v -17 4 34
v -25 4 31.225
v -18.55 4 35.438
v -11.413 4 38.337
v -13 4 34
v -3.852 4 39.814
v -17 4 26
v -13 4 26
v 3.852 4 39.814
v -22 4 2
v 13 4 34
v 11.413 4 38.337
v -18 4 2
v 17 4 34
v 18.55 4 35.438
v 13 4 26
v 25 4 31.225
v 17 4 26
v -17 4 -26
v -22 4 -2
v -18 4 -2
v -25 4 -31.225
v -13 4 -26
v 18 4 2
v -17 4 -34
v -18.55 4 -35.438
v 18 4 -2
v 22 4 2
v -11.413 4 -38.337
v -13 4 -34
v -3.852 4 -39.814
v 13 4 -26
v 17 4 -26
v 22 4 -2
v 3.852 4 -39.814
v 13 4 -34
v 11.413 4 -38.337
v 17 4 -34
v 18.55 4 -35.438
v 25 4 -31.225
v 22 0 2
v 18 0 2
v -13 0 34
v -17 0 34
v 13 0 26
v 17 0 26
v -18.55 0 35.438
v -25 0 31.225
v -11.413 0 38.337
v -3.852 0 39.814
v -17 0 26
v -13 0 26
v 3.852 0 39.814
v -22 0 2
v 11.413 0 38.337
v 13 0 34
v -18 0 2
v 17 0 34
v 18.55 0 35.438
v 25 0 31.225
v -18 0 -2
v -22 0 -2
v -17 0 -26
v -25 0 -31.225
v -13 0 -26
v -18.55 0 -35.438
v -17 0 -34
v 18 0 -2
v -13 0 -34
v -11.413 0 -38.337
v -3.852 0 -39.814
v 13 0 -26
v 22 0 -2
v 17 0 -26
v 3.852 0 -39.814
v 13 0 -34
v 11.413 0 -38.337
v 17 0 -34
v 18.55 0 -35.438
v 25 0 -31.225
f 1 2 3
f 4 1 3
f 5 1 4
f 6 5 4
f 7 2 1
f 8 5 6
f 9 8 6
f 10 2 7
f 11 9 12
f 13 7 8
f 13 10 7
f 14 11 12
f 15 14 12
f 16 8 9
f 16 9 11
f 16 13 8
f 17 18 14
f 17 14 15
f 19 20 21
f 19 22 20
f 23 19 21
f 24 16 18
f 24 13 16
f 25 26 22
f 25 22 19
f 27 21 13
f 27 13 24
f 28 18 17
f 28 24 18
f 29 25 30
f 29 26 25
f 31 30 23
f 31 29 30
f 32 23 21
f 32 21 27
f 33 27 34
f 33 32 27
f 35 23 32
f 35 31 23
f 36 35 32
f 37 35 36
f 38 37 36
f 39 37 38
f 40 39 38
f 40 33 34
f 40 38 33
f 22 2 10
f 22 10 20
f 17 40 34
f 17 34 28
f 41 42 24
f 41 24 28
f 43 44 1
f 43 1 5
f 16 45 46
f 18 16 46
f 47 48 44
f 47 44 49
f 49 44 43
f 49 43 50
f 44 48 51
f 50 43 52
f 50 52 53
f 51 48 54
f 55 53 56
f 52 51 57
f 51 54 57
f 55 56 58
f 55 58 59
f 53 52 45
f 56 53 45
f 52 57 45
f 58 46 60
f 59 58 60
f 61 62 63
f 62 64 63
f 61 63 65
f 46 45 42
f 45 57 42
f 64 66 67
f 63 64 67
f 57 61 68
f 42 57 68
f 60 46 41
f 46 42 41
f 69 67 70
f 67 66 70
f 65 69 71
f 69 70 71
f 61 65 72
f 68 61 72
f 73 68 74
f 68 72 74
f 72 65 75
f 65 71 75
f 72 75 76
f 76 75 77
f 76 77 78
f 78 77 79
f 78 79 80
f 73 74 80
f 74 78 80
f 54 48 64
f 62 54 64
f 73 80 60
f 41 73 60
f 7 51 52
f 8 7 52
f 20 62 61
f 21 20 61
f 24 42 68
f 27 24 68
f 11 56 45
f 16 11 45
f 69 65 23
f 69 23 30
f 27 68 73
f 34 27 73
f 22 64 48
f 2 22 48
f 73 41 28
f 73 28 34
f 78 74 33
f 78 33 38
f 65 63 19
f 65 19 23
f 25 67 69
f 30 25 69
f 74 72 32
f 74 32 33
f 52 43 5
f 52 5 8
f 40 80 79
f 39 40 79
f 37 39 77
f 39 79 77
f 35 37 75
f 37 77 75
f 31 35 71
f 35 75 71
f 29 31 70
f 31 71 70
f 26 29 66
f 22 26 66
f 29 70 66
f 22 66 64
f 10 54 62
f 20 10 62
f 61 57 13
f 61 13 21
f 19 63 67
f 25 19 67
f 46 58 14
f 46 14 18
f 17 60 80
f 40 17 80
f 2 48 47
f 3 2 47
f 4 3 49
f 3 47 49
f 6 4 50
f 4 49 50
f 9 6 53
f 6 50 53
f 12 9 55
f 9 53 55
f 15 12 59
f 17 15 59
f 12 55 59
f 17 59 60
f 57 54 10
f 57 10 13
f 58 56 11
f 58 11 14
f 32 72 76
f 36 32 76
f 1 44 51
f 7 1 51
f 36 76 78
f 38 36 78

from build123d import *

# Parameters (mm, degrees)
SKETCH1_W           = 4
SKETCH1_H           = 8
SKETCH1_H_2         = 4
BOSS_EXTRUDE1_DEPTH = 4


with BuildPart() as part:
    # Sketch1 → Boss-Extrude1 (new body)
    with BuildSketch(Plane(origin=(0, 0, 0), x_dir=(1, 0, 0), z_dir=(0, 1, 0))):
        with BuildLine():
            ThreePointArc((25, 31.224989992), (0, 40), (-25, 31.224989992))
            Line((-25, 31.224989992), (-25, -31.224989992))
            ThreePointArc((-25, -31.224989992), (0, -40), (25, -31.224989992))
            Line((25, -31.224989992), (25, 31.224989992))
        make_face()
        with Locations((-15, -30)):
            Rectangle(SKETCH1_W, SKETCH1_H, mode=Mode.SUBTRACT)
        with Locations((15, -30)):
            Rectangle(SKETCH1_W, SKETCH1_H, mode=Mode.SUBTRACT)
        with Locations((-20, 0)):
            Rectangle(SKETCH1_W, SKETCH1_H_2, mode=Mode.SUBTRACT)
        with Locations((-15, 30)):
            Rectangle(SKETCH1_W, SKETCH1_H, mode=Mode.SUBTRACT)
        with Locations((20, 0)):
            Rectangle(SKETCH1_W, SKETCH1_H_2, mode=Mode.SUBTRACT)
        with Locations((15, 30)):
            Rectangle(SKETCH1_W, SKETCH1_H, mode=Mode.SUBTRACT)
    extrude(amount=BOSS_EXTRUDE1_DEPTH)


solid = part.part
